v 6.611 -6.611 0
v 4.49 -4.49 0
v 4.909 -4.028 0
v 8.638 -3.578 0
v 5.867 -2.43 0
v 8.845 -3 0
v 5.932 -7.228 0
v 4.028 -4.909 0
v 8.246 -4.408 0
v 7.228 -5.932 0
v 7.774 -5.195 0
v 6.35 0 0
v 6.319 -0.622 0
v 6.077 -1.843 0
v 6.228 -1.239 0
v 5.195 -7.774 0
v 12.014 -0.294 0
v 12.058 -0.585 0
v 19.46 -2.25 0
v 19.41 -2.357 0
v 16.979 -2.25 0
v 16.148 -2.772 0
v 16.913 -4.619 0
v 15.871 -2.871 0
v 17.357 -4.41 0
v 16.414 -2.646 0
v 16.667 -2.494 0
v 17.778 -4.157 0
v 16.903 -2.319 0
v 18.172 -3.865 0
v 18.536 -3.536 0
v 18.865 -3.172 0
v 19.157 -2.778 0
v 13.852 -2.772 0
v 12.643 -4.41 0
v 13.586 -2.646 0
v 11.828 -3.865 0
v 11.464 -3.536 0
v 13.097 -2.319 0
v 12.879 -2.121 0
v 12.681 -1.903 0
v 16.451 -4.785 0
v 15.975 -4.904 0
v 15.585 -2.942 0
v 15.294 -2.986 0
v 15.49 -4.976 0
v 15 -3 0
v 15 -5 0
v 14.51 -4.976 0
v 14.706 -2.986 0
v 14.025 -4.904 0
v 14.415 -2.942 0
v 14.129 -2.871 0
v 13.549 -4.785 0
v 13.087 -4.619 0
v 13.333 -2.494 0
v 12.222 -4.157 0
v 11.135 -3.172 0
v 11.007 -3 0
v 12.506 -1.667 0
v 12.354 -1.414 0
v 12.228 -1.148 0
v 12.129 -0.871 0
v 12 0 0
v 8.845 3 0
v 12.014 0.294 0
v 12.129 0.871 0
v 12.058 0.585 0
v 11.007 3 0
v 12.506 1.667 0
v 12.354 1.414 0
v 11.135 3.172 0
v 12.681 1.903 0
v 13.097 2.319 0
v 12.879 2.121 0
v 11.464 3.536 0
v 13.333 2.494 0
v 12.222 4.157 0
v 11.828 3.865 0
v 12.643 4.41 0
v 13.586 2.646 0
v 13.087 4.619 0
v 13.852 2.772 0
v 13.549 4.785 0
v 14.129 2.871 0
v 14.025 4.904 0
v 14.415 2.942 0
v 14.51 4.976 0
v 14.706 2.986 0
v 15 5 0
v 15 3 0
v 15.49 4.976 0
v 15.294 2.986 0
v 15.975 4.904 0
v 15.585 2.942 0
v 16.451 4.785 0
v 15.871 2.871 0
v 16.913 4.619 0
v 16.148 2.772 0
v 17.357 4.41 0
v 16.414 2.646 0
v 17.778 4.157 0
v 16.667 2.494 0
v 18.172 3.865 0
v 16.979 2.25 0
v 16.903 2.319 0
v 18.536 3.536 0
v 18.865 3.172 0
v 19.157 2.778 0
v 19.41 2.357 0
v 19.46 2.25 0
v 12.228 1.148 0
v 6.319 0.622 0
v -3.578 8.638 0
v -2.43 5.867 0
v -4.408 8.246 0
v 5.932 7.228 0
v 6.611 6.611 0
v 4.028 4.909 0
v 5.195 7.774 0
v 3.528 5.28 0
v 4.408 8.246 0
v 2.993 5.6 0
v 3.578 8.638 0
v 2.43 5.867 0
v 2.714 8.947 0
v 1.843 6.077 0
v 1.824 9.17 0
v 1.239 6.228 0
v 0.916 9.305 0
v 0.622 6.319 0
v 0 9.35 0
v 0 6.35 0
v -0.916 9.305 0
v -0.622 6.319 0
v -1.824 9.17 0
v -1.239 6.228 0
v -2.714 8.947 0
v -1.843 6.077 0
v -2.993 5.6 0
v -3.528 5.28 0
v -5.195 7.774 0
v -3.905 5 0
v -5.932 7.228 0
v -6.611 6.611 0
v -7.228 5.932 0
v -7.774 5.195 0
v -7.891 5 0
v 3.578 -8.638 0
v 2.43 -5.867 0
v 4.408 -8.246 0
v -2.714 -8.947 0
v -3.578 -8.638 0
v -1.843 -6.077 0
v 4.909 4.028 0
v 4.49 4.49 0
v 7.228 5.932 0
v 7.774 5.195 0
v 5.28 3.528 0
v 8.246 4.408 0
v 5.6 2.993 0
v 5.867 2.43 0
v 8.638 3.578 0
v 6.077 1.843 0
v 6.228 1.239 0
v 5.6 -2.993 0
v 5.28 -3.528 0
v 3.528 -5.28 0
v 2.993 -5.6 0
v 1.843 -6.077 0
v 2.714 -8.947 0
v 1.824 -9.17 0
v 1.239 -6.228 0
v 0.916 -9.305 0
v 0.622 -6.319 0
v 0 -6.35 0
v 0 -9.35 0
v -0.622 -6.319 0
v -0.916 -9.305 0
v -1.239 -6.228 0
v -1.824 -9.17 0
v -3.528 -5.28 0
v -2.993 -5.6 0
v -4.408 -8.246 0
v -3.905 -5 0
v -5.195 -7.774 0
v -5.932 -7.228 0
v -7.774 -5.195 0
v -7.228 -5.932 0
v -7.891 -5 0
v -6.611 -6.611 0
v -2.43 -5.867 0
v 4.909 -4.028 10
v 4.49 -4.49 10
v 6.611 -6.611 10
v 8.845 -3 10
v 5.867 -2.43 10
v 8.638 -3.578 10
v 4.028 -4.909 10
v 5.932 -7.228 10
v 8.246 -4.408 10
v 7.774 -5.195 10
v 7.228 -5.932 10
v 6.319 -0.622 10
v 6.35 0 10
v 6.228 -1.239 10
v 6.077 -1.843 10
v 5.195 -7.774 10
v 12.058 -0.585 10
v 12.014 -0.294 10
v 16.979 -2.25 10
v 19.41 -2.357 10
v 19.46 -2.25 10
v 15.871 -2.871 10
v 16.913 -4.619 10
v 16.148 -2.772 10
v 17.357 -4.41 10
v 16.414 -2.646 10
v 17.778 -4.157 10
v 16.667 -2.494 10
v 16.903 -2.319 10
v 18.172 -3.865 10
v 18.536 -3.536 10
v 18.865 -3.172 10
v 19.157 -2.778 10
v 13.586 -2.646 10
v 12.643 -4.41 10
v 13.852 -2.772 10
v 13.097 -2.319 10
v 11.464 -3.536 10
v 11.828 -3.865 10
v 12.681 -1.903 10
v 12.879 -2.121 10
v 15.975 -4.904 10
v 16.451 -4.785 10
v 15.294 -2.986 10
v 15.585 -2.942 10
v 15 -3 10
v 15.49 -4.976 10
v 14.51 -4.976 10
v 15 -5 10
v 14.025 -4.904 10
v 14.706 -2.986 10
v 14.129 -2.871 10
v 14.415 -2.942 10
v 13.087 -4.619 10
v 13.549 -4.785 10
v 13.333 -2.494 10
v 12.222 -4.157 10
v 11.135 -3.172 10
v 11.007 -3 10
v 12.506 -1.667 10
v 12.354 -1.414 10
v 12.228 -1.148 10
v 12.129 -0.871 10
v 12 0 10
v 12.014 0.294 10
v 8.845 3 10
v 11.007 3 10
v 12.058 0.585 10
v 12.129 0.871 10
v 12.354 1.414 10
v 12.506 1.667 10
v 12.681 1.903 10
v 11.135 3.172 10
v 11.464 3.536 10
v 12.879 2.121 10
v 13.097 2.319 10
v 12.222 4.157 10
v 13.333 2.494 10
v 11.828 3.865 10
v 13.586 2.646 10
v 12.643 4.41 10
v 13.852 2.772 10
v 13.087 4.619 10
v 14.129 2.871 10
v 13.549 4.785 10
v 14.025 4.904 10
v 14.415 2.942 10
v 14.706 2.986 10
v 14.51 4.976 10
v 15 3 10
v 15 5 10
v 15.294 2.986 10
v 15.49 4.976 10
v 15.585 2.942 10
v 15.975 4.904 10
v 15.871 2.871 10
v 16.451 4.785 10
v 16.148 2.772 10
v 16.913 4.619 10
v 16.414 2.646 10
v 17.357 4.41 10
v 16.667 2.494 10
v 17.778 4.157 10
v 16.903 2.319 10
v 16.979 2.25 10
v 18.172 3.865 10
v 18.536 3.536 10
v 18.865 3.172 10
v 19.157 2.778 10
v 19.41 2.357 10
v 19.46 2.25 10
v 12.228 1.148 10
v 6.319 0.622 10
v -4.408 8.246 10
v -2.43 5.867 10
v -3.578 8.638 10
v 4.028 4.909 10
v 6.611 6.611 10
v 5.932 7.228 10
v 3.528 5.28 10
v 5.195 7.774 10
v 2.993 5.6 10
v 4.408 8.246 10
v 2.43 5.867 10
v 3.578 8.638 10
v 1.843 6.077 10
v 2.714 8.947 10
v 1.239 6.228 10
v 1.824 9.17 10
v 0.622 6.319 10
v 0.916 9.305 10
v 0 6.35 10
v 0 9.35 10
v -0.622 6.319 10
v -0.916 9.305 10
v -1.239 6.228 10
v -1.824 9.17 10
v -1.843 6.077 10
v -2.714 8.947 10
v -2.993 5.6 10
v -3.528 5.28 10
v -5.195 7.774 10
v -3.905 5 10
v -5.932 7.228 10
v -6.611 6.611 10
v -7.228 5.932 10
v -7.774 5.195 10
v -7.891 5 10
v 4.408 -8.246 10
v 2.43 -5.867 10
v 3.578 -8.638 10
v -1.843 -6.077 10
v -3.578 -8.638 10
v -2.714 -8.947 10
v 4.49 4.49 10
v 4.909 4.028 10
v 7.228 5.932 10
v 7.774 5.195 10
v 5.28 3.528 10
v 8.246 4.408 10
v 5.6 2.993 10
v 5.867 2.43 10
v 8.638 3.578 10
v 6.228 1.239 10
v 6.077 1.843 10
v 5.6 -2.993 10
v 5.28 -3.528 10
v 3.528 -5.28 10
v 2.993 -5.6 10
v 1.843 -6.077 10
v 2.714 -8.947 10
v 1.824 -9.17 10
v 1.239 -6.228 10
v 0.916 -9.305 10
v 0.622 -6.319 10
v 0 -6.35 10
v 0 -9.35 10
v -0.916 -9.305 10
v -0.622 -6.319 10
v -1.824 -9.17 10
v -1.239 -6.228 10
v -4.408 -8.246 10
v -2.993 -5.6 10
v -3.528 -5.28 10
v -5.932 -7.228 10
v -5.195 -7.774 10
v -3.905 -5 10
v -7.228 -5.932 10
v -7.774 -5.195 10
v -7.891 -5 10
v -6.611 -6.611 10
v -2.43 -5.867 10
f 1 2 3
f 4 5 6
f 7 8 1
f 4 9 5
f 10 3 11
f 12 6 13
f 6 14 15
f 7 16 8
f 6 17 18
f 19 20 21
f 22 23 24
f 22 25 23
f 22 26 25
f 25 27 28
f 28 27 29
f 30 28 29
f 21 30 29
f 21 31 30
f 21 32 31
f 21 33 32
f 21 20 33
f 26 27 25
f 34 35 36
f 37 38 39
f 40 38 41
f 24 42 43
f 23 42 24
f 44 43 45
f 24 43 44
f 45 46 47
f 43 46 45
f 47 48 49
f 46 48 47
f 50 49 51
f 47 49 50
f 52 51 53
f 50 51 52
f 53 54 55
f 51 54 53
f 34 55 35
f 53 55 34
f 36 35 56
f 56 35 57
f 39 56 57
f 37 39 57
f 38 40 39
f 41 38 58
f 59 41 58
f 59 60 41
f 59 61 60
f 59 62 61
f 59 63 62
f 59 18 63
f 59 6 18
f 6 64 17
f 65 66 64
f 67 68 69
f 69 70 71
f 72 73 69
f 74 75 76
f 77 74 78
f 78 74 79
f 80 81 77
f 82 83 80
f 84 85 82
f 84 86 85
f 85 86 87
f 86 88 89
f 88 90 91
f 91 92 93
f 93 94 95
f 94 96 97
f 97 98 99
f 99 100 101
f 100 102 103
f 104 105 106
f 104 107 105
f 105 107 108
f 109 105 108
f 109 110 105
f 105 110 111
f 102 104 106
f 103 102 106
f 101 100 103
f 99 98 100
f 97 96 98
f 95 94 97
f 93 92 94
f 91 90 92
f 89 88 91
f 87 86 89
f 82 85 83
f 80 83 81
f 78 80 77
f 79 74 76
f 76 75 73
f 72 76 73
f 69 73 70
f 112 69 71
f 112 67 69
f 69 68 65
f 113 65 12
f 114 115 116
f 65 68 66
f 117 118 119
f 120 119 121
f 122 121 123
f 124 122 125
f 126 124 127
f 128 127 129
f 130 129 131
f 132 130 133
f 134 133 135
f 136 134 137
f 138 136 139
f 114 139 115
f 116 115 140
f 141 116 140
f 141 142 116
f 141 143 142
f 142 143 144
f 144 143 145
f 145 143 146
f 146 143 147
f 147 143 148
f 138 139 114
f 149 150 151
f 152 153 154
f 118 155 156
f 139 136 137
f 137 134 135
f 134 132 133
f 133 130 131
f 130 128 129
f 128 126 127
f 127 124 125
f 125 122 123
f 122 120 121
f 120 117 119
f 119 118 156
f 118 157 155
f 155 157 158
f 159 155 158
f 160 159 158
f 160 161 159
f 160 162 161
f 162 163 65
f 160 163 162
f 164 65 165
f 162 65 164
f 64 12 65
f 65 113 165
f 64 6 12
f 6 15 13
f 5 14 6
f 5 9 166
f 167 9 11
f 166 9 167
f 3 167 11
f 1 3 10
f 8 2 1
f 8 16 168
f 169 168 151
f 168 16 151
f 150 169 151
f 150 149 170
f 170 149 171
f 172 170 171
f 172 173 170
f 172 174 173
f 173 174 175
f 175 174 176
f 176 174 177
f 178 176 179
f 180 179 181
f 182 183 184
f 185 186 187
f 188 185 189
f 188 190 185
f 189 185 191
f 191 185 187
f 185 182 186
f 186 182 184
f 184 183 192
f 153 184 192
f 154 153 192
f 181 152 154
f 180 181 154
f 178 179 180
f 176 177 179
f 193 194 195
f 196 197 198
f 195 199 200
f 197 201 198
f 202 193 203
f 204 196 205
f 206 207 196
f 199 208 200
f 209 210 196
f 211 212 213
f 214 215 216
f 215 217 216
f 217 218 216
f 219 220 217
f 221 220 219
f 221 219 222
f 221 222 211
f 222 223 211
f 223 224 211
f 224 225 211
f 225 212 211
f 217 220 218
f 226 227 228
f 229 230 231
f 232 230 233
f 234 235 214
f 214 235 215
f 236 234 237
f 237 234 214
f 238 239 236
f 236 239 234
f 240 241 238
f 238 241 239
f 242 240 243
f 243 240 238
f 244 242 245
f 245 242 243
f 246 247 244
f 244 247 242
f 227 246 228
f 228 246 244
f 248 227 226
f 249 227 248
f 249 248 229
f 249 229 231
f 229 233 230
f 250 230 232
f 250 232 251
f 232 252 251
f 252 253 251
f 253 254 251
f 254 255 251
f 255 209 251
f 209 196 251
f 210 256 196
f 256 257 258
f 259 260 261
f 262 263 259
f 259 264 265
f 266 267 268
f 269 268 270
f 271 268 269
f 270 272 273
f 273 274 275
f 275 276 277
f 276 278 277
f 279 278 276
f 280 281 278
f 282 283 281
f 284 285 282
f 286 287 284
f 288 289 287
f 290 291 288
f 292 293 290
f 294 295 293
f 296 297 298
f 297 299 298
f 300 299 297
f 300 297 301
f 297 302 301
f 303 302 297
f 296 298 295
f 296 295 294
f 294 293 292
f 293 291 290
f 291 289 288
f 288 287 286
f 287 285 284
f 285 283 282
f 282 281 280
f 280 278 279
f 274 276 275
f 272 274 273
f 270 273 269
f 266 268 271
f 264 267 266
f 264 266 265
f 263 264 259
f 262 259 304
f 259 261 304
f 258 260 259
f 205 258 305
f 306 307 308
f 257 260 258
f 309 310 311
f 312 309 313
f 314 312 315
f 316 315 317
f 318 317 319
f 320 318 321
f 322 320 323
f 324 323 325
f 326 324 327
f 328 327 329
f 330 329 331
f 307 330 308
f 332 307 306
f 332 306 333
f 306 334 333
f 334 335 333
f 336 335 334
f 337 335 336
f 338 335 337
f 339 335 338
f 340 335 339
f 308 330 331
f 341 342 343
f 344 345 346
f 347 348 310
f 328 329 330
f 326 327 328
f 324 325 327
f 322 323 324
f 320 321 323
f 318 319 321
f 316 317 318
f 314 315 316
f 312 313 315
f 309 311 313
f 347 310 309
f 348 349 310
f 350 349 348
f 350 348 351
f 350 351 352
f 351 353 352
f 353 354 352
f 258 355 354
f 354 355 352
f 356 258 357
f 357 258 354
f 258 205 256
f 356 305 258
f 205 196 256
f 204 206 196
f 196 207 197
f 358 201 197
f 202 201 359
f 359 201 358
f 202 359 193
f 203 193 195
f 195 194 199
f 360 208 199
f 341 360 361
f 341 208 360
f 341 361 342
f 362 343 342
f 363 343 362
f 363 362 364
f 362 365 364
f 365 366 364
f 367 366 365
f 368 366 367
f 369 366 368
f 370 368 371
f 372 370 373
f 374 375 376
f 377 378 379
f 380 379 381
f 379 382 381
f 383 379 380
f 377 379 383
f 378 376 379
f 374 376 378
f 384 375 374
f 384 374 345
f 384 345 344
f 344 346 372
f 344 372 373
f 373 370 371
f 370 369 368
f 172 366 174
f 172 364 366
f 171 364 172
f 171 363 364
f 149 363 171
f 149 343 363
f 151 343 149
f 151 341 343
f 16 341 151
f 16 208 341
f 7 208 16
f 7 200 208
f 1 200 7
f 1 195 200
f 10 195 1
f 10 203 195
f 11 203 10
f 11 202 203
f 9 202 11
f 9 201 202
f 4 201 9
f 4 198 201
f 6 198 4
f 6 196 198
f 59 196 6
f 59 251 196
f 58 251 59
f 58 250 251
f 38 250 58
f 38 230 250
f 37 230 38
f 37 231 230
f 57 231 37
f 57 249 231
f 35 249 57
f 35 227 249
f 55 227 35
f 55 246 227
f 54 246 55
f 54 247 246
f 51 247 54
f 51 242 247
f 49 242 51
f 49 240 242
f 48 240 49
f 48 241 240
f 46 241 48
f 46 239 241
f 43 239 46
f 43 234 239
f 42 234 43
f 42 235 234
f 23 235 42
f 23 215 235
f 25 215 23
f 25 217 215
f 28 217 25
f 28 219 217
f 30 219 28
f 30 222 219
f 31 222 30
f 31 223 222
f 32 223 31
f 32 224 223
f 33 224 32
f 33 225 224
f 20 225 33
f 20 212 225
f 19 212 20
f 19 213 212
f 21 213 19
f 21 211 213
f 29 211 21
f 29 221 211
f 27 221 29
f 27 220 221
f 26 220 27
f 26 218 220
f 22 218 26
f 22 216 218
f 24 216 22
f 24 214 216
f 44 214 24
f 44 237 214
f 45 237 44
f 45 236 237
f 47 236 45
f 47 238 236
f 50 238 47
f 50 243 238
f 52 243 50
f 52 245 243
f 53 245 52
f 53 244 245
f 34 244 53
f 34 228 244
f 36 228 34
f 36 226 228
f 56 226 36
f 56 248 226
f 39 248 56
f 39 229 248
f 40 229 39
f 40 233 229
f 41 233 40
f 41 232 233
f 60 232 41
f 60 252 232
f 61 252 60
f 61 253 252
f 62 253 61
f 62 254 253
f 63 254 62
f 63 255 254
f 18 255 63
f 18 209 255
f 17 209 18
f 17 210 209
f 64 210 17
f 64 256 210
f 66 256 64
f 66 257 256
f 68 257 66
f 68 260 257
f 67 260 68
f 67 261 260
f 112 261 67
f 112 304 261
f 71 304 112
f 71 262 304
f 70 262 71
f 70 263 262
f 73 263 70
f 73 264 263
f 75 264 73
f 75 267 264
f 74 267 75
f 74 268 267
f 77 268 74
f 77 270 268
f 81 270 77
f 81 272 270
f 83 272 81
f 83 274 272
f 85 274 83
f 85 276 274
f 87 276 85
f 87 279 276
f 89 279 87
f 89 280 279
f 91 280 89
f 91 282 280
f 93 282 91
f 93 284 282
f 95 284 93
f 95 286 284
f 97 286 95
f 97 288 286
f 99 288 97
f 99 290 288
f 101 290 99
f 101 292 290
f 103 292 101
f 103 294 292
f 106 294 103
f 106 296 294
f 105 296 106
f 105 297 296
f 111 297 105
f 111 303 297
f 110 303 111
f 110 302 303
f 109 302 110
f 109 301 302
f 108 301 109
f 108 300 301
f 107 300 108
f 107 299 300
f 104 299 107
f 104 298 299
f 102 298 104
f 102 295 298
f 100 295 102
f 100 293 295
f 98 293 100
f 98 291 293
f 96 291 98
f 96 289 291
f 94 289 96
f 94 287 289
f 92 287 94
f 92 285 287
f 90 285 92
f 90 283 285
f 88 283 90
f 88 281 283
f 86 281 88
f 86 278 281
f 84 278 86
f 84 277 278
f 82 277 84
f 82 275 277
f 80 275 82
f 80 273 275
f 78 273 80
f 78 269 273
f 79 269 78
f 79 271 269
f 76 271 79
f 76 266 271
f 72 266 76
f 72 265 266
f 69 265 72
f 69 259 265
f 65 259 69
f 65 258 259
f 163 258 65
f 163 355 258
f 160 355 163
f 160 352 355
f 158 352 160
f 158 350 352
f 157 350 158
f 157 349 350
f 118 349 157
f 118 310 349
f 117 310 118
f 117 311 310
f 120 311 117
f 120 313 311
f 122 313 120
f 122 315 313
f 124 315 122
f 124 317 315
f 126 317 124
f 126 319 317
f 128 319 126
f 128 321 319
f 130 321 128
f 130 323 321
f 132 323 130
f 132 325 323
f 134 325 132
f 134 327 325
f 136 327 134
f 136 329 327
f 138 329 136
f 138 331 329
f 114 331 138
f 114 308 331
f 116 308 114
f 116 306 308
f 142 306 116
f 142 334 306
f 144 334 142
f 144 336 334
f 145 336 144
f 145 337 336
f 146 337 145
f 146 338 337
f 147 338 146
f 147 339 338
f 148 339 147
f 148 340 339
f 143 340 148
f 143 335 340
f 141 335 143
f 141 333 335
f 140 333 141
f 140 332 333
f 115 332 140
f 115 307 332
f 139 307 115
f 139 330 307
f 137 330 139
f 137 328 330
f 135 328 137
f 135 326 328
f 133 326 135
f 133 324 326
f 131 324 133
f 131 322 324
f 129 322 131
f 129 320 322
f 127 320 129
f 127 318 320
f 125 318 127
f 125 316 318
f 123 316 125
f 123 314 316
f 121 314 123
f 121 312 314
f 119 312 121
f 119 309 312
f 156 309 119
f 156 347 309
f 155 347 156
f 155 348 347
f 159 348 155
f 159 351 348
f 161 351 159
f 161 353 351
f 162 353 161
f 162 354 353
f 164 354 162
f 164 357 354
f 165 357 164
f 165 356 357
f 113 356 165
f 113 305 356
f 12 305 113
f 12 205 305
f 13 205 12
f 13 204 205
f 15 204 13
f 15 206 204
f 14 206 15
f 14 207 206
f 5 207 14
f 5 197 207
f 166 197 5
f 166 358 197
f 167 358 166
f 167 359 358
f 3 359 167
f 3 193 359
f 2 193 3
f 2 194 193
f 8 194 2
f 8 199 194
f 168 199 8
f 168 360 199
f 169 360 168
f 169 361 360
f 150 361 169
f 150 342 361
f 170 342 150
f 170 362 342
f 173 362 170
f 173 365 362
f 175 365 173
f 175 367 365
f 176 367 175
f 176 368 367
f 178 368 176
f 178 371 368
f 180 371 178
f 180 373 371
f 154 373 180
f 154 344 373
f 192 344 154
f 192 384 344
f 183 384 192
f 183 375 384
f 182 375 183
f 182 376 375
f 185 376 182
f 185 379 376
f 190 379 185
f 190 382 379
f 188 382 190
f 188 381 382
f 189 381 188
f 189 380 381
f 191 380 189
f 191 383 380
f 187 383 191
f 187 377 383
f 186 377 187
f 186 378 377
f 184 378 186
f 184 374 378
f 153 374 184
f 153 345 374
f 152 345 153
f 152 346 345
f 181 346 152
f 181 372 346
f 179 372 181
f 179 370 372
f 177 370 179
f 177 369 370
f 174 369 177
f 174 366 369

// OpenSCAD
// Microslide clip for laboratory stand rod
// Prints lying flat (10 mm tall in Z)

$fn = 64;  // Resolution for smooth curves

// Rod grip ring dimensions
rod_hole_id = 12.7;        // Inner diameter (12.7 mm = 0.5 inch)
rod_hole_od = 18.7;        // Outer diameter
rod_slot_y_min = -5;       // Slot extends from -5 to +5 mm in Y
rod_slot_y_max = 5;

// Slide/sample ring dimensions
slide_hole_id = 6;         // Inner diameter for sample
slide_hole_od = 10;        // Outer diameter
slide_center_x = 15;       // Center position on X axis
slide_slot_y_min = -2.25;  // Slot extends from -2.25 to +2.25 mm in Y
slide_slot_y_max = 2.25;

// Bridge dimensions
bridge_x_min = 8;          // Bridge extends from 8 to 12 mm in X
bridge_x_max = 12;
bridge_y_half = 3;         // Bridge extends ±3 mm in Y (total 6 mm)

// Extrusion height
height = 10;

linear_extrude(height = height) {
    // Rod clamping ring centered at origin
    difference() {
        circle(d = rod_hole_od);
        circle(d = rod_hole_id);
        // Slot on -X side: removes x < 0 and -5 < y < 5
        translate([-100, rod_slot_y_min]) {
            square([100, rod_slot_y_max - rod_slot_y_min]);
        }
    }
    
    // Slide holding ring centered at (15, 0)
    difference() {
        translate([slide_center_x, 0]) circle(d = slide_hole_od);
        translate([slide_center_x, 0]) circle(d = slide_hole_id);
        // Slot on +X side: removes x > 15 and -2.25 < y < 2.25
        translate([slide_center_x, slide_slot_y_min]) {
            square([100, slide_slot_y_max - slide_slot_y_min]);
        }
    }
    
    // Connecting bridge from x=8 to x=12
    translate([bridge_x_min, -bridge_y_half]) {
        square([bridge_x_max - bridge_x_min, 2 * bridge_y_half]);
    }
}
